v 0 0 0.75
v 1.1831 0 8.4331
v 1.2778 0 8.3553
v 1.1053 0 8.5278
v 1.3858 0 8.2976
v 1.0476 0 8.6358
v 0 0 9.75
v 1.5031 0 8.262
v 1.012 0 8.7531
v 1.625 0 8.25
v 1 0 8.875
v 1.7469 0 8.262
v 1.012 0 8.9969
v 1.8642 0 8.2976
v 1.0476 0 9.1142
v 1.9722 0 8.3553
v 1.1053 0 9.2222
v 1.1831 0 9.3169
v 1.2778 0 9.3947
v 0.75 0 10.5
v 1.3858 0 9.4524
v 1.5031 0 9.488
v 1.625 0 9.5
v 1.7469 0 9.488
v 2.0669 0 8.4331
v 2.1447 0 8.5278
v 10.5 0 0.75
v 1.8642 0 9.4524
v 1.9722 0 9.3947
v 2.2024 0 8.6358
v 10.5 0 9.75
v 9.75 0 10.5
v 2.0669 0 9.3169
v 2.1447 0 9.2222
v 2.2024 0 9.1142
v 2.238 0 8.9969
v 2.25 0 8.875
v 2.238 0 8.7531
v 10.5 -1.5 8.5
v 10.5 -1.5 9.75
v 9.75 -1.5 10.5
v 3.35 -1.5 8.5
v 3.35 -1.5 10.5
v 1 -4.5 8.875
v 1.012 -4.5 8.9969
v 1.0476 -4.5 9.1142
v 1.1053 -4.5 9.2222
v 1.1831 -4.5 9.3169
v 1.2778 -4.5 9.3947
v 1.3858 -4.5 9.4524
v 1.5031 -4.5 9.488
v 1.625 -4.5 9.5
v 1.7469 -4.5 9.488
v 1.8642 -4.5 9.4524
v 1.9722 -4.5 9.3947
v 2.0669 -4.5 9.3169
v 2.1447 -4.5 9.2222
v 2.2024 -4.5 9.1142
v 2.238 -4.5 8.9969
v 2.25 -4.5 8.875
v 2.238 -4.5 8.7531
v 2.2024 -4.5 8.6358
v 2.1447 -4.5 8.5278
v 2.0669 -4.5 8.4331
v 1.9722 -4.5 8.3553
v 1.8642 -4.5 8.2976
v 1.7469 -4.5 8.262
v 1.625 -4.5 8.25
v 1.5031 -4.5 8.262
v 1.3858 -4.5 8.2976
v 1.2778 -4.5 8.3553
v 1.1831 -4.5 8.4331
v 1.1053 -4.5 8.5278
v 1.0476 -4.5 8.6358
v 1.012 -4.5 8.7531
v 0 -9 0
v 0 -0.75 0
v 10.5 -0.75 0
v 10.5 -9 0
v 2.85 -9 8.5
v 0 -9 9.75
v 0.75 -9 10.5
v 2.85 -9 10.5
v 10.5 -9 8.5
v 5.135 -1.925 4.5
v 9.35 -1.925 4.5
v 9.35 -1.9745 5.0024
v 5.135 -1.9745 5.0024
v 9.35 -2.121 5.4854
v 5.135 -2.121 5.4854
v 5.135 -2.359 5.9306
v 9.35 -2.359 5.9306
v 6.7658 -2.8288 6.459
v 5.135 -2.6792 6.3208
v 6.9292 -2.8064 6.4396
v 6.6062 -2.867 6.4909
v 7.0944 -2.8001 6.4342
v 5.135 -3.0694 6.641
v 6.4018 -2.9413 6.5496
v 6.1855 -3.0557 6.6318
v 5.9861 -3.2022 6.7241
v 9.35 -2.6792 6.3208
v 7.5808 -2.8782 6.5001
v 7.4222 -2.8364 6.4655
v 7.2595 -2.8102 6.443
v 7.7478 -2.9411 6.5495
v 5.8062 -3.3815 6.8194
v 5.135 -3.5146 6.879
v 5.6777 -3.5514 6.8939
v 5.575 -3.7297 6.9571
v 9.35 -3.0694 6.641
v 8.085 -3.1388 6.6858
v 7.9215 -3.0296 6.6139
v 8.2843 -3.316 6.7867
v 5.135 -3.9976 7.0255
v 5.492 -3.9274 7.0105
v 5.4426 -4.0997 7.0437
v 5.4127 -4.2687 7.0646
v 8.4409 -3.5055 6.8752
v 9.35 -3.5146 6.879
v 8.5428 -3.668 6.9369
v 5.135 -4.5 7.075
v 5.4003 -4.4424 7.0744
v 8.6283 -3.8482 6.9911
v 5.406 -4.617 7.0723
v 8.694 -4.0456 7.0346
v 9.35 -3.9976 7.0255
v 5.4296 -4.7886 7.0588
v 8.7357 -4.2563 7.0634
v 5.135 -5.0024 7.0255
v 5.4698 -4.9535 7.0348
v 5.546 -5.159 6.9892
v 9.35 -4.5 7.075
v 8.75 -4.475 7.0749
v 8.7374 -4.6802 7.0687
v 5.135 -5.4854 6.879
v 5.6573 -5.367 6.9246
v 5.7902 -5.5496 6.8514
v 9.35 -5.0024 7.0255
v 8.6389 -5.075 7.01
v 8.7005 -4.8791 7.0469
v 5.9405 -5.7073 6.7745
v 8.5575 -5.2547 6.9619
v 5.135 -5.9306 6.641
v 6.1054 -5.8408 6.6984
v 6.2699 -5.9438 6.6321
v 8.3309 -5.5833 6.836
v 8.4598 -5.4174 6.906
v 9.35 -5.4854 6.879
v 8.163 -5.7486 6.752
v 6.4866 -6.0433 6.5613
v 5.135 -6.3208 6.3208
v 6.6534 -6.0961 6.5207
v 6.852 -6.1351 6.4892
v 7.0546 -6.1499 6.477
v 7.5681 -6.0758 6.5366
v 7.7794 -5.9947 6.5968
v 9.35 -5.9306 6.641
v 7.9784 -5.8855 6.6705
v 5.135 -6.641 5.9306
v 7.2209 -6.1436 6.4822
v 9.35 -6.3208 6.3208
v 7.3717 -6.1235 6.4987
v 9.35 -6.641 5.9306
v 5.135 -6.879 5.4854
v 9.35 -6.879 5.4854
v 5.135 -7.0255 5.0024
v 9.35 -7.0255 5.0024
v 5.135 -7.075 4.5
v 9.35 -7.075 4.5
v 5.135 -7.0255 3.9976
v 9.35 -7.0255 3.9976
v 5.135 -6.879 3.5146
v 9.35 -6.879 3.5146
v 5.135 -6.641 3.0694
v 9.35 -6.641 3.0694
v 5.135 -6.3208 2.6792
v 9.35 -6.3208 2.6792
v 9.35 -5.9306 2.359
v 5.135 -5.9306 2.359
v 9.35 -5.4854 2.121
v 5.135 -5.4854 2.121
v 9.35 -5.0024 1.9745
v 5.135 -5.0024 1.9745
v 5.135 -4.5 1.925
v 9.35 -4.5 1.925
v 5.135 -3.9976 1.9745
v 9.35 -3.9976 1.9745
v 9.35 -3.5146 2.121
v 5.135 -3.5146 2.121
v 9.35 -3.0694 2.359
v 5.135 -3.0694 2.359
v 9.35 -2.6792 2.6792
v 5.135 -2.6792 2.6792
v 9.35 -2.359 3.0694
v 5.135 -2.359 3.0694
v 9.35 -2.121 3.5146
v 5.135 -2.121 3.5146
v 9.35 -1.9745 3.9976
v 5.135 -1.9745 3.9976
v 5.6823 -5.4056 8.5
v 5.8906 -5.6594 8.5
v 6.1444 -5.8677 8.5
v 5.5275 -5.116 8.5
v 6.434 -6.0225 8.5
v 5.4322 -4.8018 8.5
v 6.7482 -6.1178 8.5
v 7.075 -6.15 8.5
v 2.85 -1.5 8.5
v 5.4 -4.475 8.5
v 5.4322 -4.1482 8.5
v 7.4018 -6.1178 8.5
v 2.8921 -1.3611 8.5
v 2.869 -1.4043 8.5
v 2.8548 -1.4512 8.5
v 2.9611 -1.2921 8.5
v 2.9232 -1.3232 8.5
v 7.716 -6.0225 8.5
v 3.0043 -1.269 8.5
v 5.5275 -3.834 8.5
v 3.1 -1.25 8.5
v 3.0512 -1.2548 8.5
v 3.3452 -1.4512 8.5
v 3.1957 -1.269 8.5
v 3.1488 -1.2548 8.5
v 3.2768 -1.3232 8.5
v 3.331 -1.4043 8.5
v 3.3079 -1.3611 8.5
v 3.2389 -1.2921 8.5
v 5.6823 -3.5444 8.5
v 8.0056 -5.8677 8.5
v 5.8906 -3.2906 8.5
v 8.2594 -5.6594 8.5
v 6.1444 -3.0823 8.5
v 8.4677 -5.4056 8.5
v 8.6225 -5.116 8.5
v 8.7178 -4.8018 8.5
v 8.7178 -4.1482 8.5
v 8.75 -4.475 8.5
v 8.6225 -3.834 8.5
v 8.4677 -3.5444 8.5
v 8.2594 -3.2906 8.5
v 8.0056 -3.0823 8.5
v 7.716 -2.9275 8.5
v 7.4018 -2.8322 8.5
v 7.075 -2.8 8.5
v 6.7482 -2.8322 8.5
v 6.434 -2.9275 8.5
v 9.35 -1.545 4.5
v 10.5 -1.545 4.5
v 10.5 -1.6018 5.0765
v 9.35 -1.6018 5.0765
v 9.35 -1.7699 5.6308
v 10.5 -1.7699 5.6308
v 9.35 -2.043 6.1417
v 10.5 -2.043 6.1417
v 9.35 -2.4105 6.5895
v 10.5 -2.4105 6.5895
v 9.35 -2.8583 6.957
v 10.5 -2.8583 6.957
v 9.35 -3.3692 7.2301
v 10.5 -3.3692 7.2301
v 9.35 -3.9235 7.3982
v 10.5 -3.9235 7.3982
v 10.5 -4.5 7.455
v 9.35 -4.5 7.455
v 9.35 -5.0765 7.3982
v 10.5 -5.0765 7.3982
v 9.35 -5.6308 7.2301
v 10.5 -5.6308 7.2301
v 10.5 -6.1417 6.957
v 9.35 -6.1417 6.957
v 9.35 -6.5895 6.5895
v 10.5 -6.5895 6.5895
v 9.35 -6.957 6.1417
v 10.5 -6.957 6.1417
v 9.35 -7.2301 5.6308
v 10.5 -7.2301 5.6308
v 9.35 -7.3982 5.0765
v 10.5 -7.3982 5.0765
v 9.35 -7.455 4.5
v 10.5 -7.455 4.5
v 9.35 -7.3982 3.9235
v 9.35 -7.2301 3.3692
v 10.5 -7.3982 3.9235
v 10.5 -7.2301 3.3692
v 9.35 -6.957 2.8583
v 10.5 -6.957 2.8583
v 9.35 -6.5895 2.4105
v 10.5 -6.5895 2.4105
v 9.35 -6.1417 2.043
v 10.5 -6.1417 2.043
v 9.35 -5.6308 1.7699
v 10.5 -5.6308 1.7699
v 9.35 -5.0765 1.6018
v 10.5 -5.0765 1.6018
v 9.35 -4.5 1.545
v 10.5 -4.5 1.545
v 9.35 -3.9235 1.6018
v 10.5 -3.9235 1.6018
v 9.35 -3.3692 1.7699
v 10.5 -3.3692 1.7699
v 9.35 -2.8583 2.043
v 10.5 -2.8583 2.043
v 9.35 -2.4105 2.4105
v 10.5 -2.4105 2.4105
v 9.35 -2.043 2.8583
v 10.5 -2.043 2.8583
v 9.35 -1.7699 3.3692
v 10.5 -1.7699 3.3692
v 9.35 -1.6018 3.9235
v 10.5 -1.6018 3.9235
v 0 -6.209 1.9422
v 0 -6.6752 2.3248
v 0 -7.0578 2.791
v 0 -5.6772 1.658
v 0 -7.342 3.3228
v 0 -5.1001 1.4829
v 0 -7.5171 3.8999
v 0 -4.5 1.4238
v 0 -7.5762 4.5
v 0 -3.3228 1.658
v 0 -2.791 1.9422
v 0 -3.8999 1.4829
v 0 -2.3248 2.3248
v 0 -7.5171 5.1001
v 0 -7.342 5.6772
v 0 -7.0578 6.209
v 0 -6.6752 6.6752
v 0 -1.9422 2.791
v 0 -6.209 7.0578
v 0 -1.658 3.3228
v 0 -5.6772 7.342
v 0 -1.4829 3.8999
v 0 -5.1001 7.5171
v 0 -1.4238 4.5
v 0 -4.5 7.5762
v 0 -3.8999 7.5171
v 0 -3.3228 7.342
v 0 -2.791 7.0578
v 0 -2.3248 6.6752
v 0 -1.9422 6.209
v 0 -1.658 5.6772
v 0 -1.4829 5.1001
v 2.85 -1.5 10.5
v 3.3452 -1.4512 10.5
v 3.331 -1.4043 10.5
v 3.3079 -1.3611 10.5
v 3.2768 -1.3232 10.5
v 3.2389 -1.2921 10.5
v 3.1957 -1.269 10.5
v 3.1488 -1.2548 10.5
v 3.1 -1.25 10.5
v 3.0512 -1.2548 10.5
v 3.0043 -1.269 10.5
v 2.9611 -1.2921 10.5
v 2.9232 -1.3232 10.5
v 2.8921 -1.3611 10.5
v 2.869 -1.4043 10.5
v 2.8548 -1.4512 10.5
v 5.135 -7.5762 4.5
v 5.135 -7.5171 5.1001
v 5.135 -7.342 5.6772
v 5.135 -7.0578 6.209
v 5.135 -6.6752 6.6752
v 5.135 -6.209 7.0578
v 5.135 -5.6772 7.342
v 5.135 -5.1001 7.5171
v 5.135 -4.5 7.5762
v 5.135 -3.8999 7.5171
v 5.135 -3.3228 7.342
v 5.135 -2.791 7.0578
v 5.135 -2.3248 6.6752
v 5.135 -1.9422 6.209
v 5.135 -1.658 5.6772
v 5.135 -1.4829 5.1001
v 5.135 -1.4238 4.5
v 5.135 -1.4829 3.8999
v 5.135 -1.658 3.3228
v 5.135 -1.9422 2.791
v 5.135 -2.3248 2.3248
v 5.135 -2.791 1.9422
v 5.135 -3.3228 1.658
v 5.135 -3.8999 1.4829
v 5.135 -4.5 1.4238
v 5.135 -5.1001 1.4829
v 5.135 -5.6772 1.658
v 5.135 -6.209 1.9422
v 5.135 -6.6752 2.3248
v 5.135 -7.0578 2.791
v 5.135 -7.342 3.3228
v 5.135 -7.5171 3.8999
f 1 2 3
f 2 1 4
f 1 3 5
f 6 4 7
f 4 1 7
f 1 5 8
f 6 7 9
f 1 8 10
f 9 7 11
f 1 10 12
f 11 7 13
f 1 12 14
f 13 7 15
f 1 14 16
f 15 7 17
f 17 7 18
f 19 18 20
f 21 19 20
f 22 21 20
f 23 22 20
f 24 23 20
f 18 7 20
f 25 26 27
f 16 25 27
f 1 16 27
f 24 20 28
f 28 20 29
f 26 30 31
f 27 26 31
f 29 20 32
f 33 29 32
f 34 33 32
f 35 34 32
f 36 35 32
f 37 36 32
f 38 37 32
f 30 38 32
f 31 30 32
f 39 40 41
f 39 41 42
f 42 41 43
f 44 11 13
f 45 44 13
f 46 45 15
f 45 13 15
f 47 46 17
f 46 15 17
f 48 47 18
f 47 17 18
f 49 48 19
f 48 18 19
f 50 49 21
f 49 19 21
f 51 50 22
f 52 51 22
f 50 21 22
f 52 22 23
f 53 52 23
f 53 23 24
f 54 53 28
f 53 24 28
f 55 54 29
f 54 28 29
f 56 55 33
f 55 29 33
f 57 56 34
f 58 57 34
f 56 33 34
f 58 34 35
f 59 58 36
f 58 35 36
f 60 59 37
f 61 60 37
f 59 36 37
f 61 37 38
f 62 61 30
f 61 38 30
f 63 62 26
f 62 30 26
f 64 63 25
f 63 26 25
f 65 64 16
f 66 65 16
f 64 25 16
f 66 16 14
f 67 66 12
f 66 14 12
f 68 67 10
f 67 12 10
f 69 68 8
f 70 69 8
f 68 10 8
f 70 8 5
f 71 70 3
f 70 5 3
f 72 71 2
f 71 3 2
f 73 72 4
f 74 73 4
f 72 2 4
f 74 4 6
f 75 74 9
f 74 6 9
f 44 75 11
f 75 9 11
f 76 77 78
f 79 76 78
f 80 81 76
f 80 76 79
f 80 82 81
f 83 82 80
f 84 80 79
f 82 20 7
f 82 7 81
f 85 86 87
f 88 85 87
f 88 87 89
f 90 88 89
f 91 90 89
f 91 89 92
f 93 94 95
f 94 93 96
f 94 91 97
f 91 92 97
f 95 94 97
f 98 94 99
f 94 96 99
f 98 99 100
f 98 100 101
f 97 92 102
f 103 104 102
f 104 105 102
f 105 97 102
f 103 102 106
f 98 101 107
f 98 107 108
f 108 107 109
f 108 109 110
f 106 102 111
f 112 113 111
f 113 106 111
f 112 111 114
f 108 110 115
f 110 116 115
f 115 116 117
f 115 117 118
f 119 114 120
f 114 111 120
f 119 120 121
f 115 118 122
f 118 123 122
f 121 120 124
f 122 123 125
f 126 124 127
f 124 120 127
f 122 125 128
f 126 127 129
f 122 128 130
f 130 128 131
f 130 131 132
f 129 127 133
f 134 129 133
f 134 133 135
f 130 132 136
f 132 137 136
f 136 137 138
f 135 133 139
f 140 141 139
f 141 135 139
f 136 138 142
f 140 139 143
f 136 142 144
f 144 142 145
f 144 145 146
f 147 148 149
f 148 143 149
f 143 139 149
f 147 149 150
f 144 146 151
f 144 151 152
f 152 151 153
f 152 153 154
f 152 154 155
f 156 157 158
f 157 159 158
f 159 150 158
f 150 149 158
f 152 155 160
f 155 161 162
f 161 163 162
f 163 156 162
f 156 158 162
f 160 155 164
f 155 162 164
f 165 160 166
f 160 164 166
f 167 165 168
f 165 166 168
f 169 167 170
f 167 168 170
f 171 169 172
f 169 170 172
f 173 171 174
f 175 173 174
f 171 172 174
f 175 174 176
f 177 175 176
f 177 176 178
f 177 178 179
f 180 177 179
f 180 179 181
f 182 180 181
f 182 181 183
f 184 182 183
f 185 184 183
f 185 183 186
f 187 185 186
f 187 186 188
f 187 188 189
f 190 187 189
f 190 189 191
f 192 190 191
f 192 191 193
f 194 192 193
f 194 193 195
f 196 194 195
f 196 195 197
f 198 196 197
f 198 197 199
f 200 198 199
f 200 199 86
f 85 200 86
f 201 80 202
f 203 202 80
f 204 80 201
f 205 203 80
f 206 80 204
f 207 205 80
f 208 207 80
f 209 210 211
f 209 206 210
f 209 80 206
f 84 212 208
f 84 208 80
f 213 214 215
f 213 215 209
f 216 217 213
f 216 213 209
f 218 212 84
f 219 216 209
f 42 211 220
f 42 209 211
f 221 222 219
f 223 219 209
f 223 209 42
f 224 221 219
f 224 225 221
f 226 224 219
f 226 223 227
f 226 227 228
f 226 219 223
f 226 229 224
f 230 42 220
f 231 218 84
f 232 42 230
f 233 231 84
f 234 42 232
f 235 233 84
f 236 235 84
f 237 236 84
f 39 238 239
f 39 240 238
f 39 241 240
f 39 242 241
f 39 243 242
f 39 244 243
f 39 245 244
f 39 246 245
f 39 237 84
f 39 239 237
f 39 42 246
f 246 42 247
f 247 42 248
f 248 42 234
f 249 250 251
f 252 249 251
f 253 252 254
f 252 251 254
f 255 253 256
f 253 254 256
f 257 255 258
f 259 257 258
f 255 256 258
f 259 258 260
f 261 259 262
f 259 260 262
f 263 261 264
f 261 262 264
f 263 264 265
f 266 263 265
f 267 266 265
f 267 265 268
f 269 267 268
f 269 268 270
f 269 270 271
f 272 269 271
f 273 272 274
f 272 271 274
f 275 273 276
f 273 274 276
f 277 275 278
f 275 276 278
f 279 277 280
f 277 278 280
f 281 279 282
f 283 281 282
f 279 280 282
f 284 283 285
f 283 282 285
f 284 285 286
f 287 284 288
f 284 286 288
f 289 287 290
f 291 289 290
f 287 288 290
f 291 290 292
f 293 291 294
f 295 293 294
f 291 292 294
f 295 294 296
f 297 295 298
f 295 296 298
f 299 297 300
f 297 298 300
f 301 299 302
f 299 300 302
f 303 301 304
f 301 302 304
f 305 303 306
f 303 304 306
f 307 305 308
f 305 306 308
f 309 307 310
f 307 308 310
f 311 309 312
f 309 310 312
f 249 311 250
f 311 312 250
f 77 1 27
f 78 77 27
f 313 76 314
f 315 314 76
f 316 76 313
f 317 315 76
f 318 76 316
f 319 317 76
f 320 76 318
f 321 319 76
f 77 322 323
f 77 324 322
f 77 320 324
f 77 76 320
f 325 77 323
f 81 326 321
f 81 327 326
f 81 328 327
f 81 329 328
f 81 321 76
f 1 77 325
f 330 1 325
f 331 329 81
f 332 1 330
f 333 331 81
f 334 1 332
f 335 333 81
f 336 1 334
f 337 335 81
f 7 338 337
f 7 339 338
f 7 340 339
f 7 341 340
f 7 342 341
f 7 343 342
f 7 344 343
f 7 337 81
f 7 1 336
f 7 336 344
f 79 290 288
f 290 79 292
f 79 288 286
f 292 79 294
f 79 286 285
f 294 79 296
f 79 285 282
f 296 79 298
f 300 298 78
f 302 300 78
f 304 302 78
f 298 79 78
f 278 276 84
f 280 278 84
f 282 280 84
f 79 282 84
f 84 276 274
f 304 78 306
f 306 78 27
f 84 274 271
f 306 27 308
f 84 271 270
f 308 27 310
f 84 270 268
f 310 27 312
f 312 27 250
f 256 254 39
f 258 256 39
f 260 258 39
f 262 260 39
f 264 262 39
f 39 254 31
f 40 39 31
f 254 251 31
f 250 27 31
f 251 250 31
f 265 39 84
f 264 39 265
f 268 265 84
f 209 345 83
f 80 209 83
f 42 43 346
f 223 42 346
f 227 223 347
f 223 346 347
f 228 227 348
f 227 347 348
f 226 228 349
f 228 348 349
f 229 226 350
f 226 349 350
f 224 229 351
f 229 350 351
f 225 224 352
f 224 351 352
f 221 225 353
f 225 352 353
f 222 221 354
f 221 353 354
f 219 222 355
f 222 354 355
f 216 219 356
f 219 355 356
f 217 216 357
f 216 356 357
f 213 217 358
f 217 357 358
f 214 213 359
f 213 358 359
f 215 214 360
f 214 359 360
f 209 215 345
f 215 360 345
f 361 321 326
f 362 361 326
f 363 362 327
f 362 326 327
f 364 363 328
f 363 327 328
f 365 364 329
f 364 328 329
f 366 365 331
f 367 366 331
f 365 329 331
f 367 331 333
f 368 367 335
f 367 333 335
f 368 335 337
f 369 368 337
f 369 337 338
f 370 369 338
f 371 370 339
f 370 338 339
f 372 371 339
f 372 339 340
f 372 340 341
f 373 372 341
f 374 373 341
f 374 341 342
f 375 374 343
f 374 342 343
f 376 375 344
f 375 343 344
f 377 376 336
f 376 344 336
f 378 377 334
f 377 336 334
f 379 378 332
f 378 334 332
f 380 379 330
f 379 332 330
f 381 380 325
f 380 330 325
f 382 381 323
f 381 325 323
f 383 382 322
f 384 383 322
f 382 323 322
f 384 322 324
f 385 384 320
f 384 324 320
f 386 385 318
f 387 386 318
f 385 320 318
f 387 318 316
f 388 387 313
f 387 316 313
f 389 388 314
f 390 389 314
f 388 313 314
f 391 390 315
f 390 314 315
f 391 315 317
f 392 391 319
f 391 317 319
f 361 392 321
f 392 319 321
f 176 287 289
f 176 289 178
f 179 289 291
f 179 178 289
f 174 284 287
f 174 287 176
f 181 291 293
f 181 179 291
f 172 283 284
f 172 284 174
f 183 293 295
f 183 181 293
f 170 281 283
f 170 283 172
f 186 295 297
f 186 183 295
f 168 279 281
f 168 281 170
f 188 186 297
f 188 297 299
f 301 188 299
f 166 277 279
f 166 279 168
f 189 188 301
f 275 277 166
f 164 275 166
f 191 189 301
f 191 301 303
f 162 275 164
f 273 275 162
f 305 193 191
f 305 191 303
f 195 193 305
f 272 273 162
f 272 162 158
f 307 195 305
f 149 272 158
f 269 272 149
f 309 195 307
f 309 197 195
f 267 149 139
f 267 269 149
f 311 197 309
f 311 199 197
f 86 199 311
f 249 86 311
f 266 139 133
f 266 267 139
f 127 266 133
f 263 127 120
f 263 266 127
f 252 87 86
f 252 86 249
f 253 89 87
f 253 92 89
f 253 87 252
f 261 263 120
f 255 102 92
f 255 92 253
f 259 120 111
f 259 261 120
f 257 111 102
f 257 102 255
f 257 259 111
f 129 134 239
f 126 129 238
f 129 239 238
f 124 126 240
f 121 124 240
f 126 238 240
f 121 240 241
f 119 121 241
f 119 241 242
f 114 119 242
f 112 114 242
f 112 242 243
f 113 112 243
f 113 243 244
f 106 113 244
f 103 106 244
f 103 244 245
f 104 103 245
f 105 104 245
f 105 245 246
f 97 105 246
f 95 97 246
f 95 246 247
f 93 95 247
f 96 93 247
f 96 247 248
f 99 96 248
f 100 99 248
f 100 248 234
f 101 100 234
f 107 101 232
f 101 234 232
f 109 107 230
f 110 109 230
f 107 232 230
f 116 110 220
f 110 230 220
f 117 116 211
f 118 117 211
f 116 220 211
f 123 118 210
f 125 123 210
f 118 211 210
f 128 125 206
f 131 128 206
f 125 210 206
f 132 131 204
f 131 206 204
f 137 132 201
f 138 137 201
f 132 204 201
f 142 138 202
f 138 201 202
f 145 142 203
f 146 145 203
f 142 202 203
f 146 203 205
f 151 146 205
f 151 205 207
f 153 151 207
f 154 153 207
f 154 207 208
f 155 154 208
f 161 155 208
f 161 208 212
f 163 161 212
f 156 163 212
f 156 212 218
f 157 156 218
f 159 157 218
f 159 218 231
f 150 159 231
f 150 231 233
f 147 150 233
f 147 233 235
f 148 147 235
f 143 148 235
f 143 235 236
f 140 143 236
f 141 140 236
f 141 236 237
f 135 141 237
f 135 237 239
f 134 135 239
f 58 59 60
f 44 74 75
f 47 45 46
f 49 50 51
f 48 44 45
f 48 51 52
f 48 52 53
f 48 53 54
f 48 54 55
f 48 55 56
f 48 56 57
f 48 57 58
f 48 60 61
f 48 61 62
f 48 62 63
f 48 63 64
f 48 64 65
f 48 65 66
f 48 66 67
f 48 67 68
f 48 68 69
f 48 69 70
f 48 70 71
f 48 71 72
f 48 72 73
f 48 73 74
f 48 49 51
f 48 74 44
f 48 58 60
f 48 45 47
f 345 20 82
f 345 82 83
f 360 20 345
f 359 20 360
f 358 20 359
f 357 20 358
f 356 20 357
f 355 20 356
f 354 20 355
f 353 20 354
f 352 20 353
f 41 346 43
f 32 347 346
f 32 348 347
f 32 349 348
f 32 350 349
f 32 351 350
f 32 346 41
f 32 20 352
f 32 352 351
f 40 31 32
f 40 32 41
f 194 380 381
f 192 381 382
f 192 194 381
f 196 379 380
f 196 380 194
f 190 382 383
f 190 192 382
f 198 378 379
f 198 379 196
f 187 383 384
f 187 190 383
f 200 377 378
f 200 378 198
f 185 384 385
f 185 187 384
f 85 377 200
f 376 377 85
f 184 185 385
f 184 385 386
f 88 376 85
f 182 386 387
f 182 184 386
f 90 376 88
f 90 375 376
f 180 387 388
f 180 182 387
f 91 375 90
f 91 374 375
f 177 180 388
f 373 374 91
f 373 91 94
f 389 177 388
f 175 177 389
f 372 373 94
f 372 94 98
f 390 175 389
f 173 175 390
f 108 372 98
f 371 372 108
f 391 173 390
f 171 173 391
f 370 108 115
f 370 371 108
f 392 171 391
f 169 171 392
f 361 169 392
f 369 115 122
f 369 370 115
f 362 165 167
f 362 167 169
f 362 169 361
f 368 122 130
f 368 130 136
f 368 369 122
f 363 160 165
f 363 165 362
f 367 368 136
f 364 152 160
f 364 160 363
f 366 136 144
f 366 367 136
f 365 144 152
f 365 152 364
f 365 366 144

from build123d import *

# Parameters (mm, degrees)
F0_W      = 10.5
F0_H      = 10.5
F1_DEPTH  = 9
F2_R      = 3.0762
F3_DEPTH  = 5.135
F4_R      = 2.575
F5_DEPTH  = 25.4
F7_DEPTH  = 2
F8_R      = 1.675
F9_DEPTH  = 3
F10_SIZE  = 0.75
F11_R     = 0.625
F12_DEPTH = 4.5
F13_R     = 2.955
F14_DEPTH = 1.15


with BuildPart() as f1:
    # F0 (on Front) → F1 (new body)
    with BuildSketch(Plane.XZ):
        with Locations((5.25, 5.25)):
            Rectangle(F0_W, F0_H)
    extrude(amount=F1_DEPTH)

    # F2 (on face) → F3 (cut)
    with BuildSketch(Plane(origin=(0, 0, 0), x_dir=(0, -1, 0), z_dir=(-1, 0, 0))):
        with Locations((4.5, 4.5)):
            Circle(F2_R)
    extrude(amount=-F3_DEPTH, mode=Mode.SUBTRACT)

    # F4 (on face) → F5 (cut)
    with BuildSketch(Plane.YZ.offset(10.5)):
        with Locations((-4.5, 4.5)):
            Circle(F4_R)
    extrude(amount=-F5_DEPTH, mode=Mode.SUBTRACT)

    # F6 (on face) → F7 (cut)
    with BuildSketch(Plane.XY.offset(10.5)):
        with BuildLine():
            Line((2.85, -9), (10.5, -9))
            Line((10.5, -9), (10.5, -1.5))
            Line((10.5, -1.5), (3.35, -1.5))
            ThreePointArc((3.35, -1.5), (3.1, -1.75), (2.85, -1.5))
            Line((2.85, -1.5), (2.85, -9))
        make_face()
        with BuildLine():
            ThreePointArc((3.35, -1.5), (3.1, -1.25), (2.85, -1.5))
            Line((2.85, -1.5), (3.35, -1.5))
        make_face()
        with BuildLine():
            Line((3.35, -1.5), (2.85, -1.5))
            ThreePointArc((2.85, -1.5), (3.1, -1.75), (3.35, -1.5))
        make_face()
    extrude(amount=-F7_DEPTH, mode=Mode.SUBTRACT)

    # F8 (on face) → F9 (cut)
    with BuildSketch(Plane.XY.offset(8.5)):
        with Locations((7.075, -4.475)):
            Circle(F8_R)
    extrude(amount=-F9_DEPTH, mode=Mode.SUBTRACT)

    # F10
    f10_edges = [f1.edges().sort_by_distance(p)[0] for p in [
        (0, -4.5, 10.5),
        (5.25, 0, 0),
        (10.5, -0.75, 10.5),
    ]]
    chamfer(f10_edges, length=F10_SIZE)

    # F11 (on face) → F12 (cut)
    with BuildSketch(Plane(origin=(0, 0, 0), x_dir=(-1, 0, 0), z_dir=(0, 1, 0))):
        with Locations((-1.625, 8.875)):
            Circle(F11_R)
    extrude(amount=-F12_DEPTH, mode=Mode.SUBTRACT)

    # F13 (on face) → F14 (cut)
    with BuildSketch(Plane.YZ.offset(10.5)):
        with Locations((-4.5, 4.5)):
            Circle(F13_R)
    extrude(amount=-F14_DEPTH, mode=Mode.SUBTRACT)


solid = f1.part
